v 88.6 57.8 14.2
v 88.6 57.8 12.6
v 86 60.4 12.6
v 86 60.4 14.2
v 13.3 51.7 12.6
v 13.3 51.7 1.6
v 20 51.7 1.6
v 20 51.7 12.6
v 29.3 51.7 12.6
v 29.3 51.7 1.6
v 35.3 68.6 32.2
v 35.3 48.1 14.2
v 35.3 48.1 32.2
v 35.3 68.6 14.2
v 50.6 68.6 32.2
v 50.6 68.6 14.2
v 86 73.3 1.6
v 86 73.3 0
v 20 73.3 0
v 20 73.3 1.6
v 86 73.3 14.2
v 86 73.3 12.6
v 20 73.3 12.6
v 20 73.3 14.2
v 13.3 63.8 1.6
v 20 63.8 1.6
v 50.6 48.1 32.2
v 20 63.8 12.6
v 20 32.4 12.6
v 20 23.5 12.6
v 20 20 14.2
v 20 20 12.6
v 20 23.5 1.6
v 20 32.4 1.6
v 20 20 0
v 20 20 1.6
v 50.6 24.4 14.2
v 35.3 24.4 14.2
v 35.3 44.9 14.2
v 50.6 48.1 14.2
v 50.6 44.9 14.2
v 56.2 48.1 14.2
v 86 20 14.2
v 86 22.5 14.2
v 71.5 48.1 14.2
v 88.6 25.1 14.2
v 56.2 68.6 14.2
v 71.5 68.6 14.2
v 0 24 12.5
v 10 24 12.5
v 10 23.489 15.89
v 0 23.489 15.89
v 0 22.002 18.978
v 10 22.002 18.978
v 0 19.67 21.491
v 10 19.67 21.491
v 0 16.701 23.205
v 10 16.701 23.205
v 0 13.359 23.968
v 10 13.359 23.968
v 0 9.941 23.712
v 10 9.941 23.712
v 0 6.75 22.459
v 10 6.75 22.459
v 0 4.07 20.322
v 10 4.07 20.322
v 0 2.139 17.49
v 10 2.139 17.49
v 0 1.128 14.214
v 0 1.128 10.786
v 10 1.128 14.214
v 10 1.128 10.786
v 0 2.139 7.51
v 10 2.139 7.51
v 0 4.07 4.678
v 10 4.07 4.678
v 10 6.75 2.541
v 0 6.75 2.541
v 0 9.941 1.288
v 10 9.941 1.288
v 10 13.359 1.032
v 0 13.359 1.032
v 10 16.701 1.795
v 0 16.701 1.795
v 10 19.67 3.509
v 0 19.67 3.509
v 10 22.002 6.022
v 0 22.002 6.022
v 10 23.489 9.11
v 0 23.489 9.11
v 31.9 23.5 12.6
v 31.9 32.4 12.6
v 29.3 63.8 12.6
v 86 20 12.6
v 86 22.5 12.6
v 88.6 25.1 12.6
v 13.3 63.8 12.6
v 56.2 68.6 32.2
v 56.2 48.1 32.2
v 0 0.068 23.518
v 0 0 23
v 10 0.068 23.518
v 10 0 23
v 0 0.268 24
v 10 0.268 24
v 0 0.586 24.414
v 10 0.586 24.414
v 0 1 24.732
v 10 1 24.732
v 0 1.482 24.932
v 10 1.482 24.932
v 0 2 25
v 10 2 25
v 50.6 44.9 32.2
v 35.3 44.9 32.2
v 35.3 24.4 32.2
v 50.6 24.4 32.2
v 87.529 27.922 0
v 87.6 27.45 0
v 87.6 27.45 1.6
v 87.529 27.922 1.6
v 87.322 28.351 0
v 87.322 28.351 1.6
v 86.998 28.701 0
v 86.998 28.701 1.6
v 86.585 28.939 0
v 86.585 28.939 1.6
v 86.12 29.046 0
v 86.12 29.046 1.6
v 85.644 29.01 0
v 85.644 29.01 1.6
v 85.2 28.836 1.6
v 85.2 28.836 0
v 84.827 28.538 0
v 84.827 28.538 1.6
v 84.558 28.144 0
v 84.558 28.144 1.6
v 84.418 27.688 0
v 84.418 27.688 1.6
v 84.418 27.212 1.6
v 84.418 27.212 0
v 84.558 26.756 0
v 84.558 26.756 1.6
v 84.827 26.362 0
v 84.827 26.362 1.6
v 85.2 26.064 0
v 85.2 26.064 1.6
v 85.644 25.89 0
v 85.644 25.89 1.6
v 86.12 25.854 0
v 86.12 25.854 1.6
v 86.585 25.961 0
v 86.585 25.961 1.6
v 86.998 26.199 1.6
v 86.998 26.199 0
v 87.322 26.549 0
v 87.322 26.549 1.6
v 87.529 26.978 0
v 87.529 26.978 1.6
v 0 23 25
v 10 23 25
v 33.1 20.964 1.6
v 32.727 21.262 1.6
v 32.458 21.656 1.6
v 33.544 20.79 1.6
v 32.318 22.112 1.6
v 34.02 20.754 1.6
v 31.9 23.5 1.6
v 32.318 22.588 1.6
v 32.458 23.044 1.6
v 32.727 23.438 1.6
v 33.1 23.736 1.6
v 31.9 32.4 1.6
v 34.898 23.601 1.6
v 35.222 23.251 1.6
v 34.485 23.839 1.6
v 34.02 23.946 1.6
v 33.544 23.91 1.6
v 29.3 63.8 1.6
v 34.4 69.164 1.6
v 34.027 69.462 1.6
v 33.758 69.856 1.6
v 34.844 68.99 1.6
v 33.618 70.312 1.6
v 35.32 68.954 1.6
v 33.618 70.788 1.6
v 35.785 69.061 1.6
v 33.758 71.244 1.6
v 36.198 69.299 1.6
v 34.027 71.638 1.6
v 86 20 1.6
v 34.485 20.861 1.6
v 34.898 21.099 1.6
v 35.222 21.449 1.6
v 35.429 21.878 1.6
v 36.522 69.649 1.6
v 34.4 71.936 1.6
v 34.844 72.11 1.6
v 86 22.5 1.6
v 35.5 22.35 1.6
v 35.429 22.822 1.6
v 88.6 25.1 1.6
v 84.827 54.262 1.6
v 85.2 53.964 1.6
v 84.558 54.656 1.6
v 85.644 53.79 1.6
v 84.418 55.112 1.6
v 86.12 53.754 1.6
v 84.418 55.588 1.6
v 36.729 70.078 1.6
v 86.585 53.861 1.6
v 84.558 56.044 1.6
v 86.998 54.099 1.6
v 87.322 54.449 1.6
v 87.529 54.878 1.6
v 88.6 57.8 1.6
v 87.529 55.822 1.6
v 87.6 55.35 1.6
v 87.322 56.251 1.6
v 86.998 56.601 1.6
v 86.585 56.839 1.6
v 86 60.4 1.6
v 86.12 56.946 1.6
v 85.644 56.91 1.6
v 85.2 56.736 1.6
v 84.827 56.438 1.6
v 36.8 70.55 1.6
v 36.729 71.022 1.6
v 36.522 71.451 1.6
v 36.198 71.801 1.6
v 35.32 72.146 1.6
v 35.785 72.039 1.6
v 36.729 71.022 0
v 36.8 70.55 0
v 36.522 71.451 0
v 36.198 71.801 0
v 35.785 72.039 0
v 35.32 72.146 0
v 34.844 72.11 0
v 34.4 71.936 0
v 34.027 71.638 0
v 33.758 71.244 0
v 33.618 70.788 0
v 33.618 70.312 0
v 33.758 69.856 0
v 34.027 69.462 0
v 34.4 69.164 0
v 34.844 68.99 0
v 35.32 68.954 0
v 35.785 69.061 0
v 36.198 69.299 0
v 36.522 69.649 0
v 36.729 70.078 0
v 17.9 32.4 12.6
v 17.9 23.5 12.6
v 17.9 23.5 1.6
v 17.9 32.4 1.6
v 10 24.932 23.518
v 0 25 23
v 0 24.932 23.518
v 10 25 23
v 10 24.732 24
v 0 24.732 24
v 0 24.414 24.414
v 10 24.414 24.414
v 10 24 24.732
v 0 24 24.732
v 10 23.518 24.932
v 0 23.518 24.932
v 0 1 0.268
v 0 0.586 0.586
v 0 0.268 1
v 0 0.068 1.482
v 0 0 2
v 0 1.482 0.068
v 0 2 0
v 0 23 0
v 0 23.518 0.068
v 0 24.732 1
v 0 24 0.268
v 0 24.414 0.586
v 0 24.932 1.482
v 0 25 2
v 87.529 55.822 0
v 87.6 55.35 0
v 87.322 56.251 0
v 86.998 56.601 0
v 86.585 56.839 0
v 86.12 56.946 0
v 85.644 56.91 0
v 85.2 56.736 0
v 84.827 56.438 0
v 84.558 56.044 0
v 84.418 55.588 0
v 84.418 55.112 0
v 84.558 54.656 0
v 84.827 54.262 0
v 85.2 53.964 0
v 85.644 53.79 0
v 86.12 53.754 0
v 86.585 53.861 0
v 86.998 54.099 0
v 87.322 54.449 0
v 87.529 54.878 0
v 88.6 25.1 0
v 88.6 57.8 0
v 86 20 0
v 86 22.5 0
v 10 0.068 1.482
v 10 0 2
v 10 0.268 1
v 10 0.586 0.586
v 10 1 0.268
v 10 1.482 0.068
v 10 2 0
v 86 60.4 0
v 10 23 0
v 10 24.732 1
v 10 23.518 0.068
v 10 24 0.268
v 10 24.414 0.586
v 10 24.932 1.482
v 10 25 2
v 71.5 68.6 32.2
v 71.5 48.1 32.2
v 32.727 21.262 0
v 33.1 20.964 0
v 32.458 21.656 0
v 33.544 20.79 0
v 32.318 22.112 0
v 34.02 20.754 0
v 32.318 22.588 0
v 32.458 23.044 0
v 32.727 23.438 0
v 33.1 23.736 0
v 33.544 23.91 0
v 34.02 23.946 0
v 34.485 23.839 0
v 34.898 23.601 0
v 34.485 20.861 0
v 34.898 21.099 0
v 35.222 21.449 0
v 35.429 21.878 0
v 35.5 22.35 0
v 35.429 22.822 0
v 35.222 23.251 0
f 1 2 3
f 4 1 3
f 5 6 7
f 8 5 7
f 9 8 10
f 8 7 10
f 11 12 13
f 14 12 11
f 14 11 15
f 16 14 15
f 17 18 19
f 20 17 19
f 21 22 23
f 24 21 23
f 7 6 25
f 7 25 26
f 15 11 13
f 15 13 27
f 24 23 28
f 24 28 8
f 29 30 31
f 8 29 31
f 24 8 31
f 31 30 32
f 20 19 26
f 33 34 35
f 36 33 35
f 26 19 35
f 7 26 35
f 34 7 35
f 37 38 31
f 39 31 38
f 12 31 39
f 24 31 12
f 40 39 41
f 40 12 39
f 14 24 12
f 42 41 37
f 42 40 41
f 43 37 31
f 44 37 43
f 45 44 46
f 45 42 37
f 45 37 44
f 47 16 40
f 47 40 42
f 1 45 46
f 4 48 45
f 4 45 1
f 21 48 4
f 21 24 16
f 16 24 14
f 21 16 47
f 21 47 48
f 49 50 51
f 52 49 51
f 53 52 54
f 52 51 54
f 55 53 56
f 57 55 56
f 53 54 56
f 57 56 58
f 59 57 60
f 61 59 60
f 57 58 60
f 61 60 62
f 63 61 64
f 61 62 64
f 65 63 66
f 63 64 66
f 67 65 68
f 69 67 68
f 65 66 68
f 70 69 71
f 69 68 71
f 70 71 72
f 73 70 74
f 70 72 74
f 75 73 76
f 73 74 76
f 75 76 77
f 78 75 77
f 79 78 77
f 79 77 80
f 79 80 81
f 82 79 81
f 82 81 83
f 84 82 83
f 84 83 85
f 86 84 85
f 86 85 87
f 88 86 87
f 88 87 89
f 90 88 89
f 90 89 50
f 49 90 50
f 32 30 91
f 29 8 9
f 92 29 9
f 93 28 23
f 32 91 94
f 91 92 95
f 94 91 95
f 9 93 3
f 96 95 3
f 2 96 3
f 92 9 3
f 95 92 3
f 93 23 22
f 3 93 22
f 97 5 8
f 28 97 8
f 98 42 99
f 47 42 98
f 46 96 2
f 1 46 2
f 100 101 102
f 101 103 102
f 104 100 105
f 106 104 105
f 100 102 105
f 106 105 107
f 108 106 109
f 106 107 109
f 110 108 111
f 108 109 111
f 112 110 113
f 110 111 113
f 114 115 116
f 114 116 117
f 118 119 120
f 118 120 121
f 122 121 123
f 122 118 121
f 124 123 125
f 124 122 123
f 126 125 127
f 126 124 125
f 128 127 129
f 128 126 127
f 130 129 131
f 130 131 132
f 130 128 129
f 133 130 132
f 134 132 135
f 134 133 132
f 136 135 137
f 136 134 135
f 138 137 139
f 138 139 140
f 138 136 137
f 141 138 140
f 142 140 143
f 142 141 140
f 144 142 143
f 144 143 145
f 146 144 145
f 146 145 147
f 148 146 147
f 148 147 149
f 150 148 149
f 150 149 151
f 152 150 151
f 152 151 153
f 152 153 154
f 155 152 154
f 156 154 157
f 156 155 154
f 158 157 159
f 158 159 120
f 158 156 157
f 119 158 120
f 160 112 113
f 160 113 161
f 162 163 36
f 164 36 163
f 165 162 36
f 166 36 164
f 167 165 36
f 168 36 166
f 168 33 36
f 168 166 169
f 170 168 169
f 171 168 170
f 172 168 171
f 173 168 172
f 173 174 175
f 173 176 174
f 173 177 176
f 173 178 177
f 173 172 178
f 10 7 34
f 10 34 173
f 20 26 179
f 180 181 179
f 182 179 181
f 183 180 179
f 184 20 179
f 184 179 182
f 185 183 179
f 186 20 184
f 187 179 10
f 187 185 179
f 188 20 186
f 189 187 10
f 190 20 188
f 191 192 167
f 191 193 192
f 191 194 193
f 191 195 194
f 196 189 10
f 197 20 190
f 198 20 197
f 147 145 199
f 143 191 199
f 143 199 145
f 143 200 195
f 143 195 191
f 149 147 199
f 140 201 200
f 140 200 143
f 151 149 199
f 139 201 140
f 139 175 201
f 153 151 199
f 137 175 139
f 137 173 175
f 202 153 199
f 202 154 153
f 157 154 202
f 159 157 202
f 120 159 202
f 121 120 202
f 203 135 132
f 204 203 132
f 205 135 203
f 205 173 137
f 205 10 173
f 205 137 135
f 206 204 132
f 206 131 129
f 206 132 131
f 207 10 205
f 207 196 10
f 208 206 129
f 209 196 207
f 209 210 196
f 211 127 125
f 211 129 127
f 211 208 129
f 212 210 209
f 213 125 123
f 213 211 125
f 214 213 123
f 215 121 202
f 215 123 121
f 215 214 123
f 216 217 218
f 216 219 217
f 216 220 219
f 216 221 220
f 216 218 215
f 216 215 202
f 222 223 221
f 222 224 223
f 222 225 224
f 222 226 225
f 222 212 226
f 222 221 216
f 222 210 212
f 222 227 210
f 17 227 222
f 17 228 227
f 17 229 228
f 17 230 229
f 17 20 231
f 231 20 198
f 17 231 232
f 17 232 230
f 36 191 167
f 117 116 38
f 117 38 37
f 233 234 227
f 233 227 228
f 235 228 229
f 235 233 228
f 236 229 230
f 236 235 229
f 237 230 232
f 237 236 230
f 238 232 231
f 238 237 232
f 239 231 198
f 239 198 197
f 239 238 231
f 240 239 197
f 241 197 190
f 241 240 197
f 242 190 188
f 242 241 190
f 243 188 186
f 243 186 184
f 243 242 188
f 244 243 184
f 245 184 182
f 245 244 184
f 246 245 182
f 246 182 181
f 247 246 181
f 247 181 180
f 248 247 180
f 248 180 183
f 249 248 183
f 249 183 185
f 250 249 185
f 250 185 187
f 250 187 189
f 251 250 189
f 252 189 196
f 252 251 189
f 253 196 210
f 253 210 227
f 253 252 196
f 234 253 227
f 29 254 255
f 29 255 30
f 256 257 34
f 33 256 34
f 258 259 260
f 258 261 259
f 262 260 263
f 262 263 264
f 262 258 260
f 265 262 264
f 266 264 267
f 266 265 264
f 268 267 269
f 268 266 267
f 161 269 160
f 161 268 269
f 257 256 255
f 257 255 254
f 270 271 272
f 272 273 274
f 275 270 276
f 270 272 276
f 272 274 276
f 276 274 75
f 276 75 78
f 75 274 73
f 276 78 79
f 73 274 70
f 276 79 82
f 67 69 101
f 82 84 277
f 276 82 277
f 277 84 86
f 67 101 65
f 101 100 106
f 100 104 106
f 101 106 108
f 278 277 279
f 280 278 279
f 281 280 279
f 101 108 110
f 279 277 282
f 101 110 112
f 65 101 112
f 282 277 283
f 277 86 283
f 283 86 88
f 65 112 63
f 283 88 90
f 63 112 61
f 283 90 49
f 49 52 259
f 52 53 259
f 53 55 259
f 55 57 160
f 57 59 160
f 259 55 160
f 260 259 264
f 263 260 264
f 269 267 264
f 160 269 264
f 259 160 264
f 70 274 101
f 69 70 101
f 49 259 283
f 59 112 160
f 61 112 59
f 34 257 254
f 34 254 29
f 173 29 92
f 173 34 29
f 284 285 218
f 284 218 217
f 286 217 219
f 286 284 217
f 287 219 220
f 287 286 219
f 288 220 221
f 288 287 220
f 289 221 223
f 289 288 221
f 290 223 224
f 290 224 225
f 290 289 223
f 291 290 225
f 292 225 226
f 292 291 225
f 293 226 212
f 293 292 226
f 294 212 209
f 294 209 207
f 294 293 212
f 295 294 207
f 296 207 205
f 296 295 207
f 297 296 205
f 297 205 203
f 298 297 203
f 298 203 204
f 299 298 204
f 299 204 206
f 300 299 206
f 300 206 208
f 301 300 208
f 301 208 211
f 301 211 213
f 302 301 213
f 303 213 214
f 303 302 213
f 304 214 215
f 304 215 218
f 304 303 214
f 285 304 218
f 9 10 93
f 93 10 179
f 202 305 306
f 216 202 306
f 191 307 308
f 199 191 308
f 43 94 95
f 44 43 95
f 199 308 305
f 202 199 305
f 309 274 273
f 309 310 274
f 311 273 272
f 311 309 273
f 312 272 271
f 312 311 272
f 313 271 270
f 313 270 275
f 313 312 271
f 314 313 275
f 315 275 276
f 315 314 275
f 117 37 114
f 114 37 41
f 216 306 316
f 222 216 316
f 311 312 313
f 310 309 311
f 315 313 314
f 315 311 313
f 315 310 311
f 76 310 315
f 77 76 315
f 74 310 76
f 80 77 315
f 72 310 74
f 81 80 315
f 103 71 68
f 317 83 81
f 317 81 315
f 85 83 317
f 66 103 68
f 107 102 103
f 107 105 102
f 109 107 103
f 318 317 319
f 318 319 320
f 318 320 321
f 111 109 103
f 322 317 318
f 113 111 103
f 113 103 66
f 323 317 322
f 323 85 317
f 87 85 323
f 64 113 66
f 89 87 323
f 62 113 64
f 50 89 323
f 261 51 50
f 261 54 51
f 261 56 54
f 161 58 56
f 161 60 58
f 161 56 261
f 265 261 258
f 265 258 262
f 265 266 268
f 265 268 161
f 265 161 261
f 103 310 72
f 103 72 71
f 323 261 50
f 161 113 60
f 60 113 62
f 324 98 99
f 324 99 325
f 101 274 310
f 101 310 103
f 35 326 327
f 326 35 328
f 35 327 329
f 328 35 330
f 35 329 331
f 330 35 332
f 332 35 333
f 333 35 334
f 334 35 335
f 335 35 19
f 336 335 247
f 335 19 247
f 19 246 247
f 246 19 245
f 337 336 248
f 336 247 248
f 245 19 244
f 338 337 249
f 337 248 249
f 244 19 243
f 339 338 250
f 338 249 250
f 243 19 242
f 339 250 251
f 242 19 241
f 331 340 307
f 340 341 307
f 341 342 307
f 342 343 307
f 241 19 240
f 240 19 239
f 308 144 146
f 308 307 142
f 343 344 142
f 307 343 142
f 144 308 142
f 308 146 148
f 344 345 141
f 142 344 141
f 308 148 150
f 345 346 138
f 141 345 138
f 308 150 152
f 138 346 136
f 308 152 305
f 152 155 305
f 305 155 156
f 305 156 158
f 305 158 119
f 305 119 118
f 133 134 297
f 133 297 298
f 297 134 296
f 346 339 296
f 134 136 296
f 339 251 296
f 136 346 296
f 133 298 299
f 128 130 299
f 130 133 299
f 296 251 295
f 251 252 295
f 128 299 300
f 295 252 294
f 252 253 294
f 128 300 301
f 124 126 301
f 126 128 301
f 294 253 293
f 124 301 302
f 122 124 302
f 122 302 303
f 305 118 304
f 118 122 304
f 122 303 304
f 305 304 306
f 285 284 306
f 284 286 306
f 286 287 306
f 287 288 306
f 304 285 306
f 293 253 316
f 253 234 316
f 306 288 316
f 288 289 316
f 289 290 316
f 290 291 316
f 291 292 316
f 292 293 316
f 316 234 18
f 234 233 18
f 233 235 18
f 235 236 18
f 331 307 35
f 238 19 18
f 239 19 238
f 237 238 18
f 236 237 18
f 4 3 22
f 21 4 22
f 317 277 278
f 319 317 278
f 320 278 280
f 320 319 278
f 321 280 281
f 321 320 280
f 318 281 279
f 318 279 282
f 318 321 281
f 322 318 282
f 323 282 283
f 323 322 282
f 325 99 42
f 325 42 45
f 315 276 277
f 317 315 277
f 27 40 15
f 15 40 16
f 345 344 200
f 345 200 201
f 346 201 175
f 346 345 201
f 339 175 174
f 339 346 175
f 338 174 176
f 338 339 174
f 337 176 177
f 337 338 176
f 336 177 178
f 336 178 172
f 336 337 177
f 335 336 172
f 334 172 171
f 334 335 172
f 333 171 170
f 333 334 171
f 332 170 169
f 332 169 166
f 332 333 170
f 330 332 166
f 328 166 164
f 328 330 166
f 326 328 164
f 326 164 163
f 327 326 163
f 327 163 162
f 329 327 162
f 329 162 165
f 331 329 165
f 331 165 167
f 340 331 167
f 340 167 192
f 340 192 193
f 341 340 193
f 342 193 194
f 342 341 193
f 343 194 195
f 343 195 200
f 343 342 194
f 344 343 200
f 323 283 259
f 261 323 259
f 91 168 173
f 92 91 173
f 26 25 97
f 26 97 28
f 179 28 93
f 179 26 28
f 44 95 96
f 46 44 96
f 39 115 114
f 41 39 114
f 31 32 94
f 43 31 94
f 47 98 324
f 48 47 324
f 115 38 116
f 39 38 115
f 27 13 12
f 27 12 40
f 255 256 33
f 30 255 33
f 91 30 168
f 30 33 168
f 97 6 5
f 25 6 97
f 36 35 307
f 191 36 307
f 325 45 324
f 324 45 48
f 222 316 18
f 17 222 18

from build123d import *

# Parameters (mm, degrees)
SKETCH_R      = 1.6
PAD_DEPTH     = 1.6
SKETCH001_W   = 14
SKETCH001_H   = 8.9
SKETCH001_W_2 = 16
SKETCH001_H_2 = 12.1
PAD001_DEPTH  = 11
PAD002_DEPTH  = 1.6
SKETCH003_W   = 15.3
SKETCH003_H   = 20.5
PAD003_DEPTH  = 18
SKETCH004_W   = 25
SKETCH004_H   = 25
PAD004_DEPTH  = 10
FILLET_R      = 2
SKETCH006_R   = 11.5
POCKET_DEPTH  = 10.001


with BuildPart() as board:
    # Sketch → Pad (new body)
    with BuildSketch(Plane.XY):
        Polygon((20, 73.3), (20, 20), (86, 20), (86, 22.5), (88.6, 25.1), (88.6, 57.8), (86, 60.4), (86, 73.3), align=None)
        with Locations((33.9, 22.35)):
            Circle(SKETCH_R, mode=Mode.SUBTRACT)
        with Locations((86, 27.45)):
            Circle(SKETCH_R, mode=Mode.SUBTRACT)
        with Locations((86, 55.35)):
            Circle(SKETCH_R, mode=Mode.SUBTRACT)
        with Locations((35.2, 70.55)):
            Circle(SKETCH_R, mode=Mode.SUBTRACT)
    extrude(amount=PAD_DEPTH)

    # Sketch001 (on Face14 of Pad) → Pad001 (join)
    with BuildSketch(Plane.XY.offset(1.6)):
        with Locations((24.9, 27.95)):
            Rectangle(SKETCH001_W, SKETCH001_H)
        with Locations((21.3, 57.75)):
            Rectangle(SKETCH001_W_2, SKETCH001_H_2)
    extrude(amount=PAD001_DEPTH)

    # Sketch002 (on Face26 of Pad001) → Pad002 (join)
    with BuildSketch(Plane.XY.offset(12.6)):
        Polygon((20, 73.3), (20, 20), (86, 20), (86, 22.5), (88.6, 25.1), (88.6, 57.8), (86, 60.4), (86, 73.3), align=None)
    extrude(amount=PAD002_DEPTH)

    # Sketch003 (on Face36 of Pad002) → Pad003 (join)
    with BuildSketch(Plane.XY.offset(14.2)):
        with Locations((42.95, 58.35)):
            Rectangle(SKETCH003_W, SKETCH003_H)
        with Locations((63.85, 58.35)):
            Rectangle(SKETCH003_W, SKETCH003_H)
        with Locations((42.95, 34.65)):
            Rectangle(SKETCH003_W, SKETCH003_H)
    extrude(amount=PAD003_DEPTH)


with BuildPart() as fan:
    # Sketch004 → Pad004 (new body)
    with BuildSketch(Plane.YZ):
        with Locations((12.5, 12.5)):
            Rectangle(SKETCH004_W, SKETCH004_H)
    extrude(amount=PAD004_DEPTH)

    # Fillet
    fillet_edges = [fan.edges().sort_by_distance(p)[0] for p in [
        (5, 0, 25),
        (5, 25, 25),
        (5, 0, 0),
        (5, 25, 0),
    ]]
    fillet(fillet_edges, radius=FILLET_R)

    # Sketch006 (on Face5 of Fillet) → Pocket (cut, through all)
    with BuildSketch(Plane.YZ.offset(10)):
        with Locations((12.5, 12.5)):
            Circle(SKETCH006_R)
    extrude(amount=-POCKET_DEPTH, mode=Mode.SUBTRACT)


solid = Compound([board.part, fan.part])
